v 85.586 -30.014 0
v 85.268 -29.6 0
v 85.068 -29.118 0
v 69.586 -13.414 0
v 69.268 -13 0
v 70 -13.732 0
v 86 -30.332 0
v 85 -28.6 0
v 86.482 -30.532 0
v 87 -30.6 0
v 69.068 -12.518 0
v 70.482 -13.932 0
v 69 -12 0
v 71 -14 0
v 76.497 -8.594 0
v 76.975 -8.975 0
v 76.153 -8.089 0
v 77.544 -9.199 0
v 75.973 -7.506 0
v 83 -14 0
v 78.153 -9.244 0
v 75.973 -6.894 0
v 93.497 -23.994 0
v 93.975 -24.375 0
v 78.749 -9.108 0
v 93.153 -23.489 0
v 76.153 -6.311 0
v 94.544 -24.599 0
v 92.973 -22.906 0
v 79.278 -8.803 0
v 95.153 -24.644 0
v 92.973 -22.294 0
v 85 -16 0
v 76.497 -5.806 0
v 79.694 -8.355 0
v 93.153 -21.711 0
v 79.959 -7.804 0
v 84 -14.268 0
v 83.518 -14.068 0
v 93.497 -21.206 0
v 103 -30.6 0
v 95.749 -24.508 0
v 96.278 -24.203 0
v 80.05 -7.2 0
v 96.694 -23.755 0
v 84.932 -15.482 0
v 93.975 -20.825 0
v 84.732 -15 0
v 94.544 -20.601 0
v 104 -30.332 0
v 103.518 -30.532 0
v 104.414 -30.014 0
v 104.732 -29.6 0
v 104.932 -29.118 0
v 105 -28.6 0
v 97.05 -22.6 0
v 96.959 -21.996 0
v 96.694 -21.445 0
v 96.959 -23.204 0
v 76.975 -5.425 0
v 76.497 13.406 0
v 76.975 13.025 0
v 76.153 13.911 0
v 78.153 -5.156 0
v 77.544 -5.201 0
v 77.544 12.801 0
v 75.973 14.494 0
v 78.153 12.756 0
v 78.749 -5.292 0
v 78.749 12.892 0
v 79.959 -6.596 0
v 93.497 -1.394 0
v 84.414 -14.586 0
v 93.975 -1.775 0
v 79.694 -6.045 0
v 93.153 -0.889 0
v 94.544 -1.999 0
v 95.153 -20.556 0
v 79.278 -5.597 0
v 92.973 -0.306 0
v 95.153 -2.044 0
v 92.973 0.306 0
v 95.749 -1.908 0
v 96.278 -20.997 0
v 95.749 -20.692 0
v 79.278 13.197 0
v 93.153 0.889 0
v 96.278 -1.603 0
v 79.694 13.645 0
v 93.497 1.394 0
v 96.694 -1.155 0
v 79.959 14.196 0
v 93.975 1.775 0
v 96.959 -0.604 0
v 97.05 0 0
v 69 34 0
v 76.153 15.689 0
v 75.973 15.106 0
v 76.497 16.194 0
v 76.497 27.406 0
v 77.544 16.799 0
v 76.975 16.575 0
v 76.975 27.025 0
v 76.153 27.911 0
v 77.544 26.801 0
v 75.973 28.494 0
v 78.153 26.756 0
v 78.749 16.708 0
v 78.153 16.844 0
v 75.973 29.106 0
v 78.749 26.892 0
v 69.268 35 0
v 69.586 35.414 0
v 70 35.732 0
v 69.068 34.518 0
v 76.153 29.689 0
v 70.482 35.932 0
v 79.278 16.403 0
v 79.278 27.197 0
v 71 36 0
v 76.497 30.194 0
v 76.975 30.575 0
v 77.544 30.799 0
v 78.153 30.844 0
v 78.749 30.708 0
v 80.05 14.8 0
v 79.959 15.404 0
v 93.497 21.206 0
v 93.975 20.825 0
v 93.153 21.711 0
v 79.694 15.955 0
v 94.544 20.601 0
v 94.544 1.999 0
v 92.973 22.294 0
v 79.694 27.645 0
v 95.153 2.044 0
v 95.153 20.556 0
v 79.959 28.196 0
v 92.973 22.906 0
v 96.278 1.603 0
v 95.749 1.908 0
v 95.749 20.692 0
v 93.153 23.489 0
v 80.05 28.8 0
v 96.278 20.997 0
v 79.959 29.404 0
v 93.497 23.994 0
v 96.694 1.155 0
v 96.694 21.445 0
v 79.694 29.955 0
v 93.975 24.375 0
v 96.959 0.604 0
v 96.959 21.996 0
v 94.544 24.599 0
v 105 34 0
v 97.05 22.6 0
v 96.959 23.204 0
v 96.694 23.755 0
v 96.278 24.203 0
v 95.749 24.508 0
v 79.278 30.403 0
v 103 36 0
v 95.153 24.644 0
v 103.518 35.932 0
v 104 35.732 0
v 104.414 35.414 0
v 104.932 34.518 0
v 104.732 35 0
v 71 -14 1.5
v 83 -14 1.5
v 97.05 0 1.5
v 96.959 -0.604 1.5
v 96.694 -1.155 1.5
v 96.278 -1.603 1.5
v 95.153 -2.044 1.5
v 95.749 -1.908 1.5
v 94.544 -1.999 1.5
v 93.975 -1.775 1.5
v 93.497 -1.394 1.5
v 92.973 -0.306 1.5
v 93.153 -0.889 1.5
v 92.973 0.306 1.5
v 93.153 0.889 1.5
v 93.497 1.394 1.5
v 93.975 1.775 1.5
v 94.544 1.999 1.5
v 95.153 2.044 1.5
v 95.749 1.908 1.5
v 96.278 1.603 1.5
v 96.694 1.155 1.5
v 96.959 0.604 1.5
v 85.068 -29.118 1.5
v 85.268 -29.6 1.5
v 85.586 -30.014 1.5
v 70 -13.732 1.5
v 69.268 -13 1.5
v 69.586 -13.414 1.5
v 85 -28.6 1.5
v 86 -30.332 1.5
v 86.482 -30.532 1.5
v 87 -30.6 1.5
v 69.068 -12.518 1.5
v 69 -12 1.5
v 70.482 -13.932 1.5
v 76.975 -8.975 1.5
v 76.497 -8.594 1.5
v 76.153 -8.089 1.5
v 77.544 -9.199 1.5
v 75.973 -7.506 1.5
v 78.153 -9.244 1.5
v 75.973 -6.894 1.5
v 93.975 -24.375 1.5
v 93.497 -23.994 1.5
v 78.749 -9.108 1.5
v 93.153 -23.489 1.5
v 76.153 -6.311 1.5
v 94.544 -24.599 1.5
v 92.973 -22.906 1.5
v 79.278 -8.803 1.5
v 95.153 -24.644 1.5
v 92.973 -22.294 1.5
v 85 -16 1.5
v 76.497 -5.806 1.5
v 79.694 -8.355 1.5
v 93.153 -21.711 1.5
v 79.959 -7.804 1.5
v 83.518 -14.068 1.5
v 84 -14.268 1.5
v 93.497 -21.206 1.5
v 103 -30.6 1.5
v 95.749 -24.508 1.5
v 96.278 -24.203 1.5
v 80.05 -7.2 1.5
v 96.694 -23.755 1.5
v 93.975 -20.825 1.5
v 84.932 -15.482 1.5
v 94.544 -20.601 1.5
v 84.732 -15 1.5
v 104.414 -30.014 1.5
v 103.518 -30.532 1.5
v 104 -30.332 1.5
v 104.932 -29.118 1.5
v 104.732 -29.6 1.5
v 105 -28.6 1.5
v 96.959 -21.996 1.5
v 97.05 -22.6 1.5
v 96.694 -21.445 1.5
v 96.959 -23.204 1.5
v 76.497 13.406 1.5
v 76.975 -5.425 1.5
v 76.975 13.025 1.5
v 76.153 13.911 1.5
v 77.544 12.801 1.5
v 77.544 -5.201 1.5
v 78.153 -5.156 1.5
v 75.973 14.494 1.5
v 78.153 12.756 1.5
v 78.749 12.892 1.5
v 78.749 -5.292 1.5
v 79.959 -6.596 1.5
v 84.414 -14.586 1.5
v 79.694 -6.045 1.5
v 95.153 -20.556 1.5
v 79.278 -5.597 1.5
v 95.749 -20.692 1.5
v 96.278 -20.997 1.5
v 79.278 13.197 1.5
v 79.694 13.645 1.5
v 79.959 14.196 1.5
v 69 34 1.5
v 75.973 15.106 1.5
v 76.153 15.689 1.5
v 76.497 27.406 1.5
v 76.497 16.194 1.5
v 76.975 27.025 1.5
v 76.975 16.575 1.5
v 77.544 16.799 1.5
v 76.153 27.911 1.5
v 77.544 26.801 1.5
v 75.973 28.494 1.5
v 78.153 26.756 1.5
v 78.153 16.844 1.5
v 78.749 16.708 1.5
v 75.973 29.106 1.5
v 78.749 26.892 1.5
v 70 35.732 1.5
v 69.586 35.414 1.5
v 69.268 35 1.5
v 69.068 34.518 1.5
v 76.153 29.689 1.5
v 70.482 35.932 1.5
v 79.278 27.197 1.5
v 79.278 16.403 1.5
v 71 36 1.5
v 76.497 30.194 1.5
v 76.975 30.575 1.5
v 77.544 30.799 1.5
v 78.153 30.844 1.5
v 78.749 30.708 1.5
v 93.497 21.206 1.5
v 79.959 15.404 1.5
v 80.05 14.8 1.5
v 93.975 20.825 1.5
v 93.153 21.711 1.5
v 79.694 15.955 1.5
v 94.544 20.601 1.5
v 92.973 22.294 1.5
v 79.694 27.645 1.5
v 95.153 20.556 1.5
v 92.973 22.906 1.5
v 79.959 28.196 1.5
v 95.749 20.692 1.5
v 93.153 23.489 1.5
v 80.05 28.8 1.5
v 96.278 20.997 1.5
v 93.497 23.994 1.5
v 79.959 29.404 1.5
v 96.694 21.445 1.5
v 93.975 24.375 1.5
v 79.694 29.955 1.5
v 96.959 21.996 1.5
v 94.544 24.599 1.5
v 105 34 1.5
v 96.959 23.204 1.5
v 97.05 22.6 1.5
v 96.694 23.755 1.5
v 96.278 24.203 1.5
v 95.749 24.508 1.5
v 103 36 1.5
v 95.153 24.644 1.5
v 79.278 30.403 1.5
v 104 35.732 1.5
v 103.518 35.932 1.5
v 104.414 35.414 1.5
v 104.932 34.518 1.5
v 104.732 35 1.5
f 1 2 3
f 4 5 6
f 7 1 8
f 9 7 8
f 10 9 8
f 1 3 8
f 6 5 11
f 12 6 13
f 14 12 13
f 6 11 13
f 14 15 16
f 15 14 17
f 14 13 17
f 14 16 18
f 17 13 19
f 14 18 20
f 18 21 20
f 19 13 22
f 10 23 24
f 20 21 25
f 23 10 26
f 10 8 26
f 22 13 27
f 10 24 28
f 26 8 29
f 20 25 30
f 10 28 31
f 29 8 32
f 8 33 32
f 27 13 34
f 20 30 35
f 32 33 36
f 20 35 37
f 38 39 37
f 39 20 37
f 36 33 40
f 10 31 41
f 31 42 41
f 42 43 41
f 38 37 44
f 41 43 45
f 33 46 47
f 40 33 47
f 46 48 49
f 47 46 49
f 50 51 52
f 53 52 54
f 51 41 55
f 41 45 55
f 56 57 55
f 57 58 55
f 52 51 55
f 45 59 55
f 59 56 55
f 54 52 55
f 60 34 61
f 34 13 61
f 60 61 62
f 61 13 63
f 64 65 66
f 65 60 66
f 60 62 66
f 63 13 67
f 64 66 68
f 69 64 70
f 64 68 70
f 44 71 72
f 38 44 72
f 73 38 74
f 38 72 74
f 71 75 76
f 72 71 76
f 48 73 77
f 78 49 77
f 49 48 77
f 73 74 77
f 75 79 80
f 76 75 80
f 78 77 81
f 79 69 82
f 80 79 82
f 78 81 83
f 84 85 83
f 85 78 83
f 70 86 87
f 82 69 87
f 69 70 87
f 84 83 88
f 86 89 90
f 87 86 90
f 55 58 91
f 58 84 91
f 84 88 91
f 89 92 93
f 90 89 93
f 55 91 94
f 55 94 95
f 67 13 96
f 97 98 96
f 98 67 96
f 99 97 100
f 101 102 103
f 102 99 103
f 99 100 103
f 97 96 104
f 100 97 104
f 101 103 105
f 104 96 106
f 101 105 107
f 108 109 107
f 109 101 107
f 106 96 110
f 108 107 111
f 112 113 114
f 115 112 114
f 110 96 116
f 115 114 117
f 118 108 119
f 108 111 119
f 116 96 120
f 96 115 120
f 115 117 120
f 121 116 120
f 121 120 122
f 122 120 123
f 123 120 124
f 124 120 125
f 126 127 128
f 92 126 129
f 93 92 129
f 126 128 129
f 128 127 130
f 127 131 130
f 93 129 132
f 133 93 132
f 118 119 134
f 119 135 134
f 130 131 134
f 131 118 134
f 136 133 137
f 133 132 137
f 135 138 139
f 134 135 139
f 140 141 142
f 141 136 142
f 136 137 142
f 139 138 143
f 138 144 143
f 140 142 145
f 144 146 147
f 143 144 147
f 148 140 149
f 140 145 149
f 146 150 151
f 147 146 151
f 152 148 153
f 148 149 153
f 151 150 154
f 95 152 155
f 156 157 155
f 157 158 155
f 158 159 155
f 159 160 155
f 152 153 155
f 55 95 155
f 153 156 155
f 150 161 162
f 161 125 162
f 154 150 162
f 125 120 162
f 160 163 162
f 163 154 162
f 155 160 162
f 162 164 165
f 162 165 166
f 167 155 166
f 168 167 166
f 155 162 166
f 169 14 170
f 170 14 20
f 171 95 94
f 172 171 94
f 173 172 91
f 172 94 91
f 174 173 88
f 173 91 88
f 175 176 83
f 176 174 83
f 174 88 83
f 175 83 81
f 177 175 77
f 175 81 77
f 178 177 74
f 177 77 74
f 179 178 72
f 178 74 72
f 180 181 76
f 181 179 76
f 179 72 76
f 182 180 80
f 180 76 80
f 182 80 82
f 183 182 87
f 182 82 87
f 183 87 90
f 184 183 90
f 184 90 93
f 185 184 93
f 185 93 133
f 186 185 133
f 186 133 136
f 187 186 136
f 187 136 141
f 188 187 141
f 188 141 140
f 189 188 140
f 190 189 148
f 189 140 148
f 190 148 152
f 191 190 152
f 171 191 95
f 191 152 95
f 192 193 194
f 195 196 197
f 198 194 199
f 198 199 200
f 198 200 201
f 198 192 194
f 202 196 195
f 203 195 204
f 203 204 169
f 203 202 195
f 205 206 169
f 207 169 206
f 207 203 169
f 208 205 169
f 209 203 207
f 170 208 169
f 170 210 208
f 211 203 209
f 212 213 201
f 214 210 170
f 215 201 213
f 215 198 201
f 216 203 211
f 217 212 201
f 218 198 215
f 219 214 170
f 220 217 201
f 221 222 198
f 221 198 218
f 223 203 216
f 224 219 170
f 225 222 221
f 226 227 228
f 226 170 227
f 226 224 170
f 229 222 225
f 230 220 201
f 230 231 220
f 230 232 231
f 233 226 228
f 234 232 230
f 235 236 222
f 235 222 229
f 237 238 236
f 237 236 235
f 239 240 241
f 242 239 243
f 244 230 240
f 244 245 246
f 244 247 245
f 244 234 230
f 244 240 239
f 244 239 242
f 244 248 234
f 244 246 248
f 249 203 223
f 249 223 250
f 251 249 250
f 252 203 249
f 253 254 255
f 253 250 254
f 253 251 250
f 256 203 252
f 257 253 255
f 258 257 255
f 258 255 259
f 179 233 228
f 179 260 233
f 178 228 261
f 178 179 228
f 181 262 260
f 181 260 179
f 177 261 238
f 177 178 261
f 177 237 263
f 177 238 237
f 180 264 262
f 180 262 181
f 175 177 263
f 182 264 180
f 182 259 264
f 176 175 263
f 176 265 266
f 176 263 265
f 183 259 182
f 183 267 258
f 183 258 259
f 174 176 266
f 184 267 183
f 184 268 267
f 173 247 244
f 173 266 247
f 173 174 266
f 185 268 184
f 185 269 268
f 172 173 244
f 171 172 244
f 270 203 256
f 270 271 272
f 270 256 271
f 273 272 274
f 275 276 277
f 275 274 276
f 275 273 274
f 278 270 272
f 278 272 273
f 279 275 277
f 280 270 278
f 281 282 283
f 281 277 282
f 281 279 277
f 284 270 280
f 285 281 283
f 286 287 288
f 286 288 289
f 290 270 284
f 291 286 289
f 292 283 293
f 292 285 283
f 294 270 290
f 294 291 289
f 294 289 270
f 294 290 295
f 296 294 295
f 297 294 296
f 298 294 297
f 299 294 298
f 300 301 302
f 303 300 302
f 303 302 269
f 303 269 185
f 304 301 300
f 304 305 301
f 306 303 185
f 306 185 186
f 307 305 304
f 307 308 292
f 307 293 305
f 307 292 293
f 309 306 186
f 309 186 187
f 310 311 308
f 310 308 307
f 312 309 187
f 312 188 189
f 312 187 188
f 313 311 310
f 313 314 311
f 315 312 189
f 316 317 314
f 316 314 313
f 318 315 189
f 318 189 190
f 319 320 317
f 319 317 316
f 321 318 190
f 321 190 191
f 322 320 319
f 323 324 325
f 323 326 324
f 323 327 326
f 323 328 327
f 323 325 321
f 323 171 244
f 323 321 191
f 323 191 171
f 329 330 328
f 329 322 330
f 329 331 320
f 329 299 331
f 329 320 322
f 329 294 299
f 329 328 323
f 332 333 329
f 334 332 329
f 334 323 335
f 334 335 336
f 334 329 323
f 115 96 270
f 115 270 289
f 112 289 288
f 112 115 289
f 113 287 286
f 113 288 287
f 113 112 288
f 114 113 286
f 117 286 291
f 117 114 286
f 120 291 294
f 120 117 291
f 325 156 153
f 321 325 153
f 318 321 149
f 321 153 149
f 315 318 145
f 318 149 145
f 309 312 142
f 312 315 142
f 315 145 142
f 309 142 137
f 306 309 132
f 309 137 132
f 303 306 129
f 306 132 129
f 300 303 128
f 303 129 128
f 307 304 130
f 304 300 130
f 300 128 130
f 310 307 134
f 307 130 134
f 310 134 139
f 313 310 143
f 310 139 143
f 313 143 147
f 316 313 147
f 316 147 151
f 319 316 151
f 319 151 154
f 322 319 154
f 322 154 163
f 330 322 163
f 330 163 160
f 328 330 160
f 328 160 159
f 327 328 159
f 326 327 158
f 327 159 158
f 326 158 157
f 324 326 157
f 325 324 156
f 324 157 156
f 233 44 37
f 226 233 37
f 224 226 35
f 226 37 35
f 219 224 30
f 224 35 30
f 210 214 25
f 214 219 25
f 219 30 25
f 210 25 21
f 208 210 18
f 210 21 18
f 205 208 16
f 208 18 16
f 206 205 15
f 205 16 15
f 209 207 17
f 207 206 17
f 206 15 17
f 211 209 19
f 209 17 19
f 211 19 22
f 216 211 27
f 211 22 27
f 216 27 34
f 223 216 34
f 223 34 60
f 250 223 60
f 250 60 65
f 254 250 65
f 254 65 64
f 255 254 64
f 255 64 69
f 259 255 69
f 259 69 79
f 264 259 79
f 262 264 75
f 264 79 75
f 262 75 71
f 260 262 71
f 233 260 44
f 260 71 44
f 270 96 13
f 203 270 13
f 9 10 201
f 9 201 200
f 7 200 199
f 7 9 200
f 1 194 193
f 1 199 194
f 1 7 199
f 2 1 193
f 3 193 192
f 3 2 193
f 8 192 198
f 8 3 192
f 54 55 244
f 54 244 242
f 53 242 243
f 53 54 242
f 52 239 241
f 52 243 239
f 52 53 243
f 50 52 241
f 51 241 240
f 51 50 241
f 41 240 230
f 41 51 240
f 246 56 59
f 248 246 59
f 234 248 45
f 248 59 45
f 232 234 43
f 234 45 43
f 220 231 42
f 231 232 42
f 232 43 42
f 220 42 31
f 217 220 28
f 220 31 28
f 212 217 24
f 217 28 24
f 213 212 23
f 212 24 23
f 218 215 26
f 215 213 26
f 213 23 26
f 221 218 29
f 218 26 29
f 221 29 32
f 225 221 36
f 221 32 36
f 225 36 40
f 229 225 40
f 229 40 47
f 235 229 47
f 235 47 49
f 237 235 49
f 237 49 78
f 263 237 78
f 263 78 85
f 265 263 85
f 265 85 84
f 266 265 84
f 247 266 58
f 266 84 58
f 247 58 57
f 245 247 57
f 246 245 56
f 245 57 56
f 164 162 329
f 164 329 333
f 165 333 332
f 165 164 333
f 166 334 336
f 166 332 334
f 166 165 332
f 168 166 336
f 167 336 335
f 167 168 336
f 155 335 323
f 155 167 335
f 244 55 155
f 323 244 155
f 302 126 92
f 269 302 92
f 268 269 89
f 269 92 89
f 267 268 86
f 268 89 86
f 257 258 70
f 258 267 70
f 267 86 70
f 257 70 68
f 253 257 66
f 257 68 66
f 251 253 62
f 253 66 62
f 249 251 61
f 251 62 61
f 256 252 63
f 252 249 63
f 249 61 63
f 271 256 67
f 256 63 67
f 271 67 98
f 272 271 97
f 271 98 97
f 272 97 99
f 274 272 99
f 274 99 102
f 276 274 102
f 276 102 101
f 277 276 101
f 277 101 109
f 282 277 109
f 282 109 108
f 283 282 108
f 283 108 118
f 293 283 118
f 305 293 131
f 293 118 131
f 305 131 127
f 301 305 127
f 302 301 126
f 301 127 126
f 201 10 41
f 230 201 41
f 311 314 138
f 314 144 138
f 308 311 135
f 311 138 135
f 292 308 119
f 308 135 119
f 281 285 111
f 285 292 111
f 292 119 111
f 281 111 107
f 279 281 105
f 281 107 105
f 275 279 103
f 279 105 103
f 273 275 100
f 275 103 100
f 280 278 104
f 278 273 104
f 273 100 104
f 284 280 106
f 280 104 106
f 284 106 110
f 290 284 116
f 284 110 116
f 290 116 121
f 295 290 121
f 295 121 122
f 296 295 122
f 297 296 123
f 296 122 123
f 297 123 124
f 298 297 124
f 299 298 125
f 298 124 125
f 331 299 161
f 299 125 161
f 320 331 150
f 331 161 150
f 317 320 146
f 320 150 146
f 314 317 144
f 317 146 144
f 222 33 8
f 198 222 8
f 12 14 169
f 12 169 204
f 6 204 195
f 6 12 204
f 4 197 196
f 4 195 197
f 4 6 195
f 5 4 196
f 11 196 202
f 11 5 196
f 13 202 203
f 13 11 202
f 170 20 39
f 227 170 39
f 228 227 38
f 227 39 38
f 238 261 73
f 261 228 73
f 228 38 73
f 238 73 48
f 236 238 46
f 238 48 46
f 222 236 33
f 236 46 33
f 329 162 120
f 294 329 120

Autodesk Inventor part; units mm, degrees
ref_plane "YZ Plane" through (0, 0, 0) normal (1, 0, 0) x (0, 1, 0)
ref_plane "XZ Plane" through (0, 0, 0) normal (0, 1, 0) x (-1, 0, 0)
ref_plane "XY Plane" through (0, 0, 0) normal (0, 0, 1) x (1, 0, 0)
sketch "Sketch2" plane through (0, 0, 0) normal (0, 0, 1) x (1, 0, 0)
  arc A0 (93, -22.6) -> (97, -22.6) centre (95, -22.6) ccw construction
  arc A1 (97, -22.6) -> (93, -22.6) centre (95, -22.6) ccw construction
  arc A2 (97, 22.6) -> (93, 22.6) centre (95, 22.6) ccw construction
  arc A3 (93, 22.6) -> (97, 22.6) centre (95, 22.6) ccw construction
  line L0 (207.9, 0) -> (-207.9, 0) construction
  line L1 (0, -294.0706) -> (0, 294.0706) construction
  line L2 (87, -30.6) -> (103, -30.6)
  line L3 (105, -28.6) -> (105, 34)
  line L4 (103, 36) -> (71, 36)
  line L5 (69, 34) -> (69, -12)
  line L6 (71, -14) -> (83, -14)
  line L7 (85, -16) -> (85, -28.6)
  arc A4 (103, -30.6) -> (105, -28.6) centre (103, -28.6) ccw
  arc A5 (85, -28.6) -> (87, -30.6) centre (87, -28.6) ccw
  arc A6 (85, -16) -> (83, -14) centre (83, -16) ccw
  arc A7 (69, -12) -> (71, -14) centre (71, -12) ccw
  arc A8 (71, 36) -> (69, 34) centre (71, 34) ccw
  arc A9 (105, 34) -> (103, 36) centre (103, 34) ccw
  circle A10 centre (78, -7.2) radius 2.05
  circle A11 centre (78, 14.8) radius 2.05
  circle A12 centre (78, 28.8) radius 2.05
  line L8 (78, -7.2) -> (78, 28.8) construction
  line L9 (98, -18.65) -> (98, -26.55) construction
  line L10 (98, -26.55) -> (92, -26.55) construction
  line L11 (92, -18.65) -> (92, -26.55) construction
  line L12 (98, -18.65) -> (92, -18.65) construction
  arc A13 (97, -22.6) -> (93, -22.6) centre (95, -22.6) ccw construction
  arc A14 (93, -22.6) -> (97, -22.6) centre (95, -22.6) ccw construction
  line L13 (92, 18.65) -> (92, 26.55) construction
  line L14 (92, 26.55) -> (98, 26.55) construction
  line L15 (98, 18.65) -> (98, 26.55) construction
  line L16 (92, 18.65) -> (98, 18.65) construction
  arc A15 (93, 22.6) -> (97, 22.6) centre (95, 22.6) ccw construction
  arc A16 (97, 22.6) -> (93, 22.6) centre (95, 22.6) ccw construction
  arc A17 (97, -22.6) -> (93, -22.6) centre (95, -22.6) ccw construction
  arc A18 (97.4356, -1.2768) -> (97.4356, 1.2768) centre (95, 0) ccw construction
  circle A19 centre (95, 0) radius 2.05
  circle A20 centre (95, 22.6) radius 2.05
  circle A21 centre (95, -22.6) radius 2.05
  point P0 (0, 0)
  point P1 (105, 36)
  point P2 (69, 36)
extrude "Extrusion2" add sketch "Sketch2" along normal blind 1.5
properties part number "Oxy_cut" material "Stainless Steel"
